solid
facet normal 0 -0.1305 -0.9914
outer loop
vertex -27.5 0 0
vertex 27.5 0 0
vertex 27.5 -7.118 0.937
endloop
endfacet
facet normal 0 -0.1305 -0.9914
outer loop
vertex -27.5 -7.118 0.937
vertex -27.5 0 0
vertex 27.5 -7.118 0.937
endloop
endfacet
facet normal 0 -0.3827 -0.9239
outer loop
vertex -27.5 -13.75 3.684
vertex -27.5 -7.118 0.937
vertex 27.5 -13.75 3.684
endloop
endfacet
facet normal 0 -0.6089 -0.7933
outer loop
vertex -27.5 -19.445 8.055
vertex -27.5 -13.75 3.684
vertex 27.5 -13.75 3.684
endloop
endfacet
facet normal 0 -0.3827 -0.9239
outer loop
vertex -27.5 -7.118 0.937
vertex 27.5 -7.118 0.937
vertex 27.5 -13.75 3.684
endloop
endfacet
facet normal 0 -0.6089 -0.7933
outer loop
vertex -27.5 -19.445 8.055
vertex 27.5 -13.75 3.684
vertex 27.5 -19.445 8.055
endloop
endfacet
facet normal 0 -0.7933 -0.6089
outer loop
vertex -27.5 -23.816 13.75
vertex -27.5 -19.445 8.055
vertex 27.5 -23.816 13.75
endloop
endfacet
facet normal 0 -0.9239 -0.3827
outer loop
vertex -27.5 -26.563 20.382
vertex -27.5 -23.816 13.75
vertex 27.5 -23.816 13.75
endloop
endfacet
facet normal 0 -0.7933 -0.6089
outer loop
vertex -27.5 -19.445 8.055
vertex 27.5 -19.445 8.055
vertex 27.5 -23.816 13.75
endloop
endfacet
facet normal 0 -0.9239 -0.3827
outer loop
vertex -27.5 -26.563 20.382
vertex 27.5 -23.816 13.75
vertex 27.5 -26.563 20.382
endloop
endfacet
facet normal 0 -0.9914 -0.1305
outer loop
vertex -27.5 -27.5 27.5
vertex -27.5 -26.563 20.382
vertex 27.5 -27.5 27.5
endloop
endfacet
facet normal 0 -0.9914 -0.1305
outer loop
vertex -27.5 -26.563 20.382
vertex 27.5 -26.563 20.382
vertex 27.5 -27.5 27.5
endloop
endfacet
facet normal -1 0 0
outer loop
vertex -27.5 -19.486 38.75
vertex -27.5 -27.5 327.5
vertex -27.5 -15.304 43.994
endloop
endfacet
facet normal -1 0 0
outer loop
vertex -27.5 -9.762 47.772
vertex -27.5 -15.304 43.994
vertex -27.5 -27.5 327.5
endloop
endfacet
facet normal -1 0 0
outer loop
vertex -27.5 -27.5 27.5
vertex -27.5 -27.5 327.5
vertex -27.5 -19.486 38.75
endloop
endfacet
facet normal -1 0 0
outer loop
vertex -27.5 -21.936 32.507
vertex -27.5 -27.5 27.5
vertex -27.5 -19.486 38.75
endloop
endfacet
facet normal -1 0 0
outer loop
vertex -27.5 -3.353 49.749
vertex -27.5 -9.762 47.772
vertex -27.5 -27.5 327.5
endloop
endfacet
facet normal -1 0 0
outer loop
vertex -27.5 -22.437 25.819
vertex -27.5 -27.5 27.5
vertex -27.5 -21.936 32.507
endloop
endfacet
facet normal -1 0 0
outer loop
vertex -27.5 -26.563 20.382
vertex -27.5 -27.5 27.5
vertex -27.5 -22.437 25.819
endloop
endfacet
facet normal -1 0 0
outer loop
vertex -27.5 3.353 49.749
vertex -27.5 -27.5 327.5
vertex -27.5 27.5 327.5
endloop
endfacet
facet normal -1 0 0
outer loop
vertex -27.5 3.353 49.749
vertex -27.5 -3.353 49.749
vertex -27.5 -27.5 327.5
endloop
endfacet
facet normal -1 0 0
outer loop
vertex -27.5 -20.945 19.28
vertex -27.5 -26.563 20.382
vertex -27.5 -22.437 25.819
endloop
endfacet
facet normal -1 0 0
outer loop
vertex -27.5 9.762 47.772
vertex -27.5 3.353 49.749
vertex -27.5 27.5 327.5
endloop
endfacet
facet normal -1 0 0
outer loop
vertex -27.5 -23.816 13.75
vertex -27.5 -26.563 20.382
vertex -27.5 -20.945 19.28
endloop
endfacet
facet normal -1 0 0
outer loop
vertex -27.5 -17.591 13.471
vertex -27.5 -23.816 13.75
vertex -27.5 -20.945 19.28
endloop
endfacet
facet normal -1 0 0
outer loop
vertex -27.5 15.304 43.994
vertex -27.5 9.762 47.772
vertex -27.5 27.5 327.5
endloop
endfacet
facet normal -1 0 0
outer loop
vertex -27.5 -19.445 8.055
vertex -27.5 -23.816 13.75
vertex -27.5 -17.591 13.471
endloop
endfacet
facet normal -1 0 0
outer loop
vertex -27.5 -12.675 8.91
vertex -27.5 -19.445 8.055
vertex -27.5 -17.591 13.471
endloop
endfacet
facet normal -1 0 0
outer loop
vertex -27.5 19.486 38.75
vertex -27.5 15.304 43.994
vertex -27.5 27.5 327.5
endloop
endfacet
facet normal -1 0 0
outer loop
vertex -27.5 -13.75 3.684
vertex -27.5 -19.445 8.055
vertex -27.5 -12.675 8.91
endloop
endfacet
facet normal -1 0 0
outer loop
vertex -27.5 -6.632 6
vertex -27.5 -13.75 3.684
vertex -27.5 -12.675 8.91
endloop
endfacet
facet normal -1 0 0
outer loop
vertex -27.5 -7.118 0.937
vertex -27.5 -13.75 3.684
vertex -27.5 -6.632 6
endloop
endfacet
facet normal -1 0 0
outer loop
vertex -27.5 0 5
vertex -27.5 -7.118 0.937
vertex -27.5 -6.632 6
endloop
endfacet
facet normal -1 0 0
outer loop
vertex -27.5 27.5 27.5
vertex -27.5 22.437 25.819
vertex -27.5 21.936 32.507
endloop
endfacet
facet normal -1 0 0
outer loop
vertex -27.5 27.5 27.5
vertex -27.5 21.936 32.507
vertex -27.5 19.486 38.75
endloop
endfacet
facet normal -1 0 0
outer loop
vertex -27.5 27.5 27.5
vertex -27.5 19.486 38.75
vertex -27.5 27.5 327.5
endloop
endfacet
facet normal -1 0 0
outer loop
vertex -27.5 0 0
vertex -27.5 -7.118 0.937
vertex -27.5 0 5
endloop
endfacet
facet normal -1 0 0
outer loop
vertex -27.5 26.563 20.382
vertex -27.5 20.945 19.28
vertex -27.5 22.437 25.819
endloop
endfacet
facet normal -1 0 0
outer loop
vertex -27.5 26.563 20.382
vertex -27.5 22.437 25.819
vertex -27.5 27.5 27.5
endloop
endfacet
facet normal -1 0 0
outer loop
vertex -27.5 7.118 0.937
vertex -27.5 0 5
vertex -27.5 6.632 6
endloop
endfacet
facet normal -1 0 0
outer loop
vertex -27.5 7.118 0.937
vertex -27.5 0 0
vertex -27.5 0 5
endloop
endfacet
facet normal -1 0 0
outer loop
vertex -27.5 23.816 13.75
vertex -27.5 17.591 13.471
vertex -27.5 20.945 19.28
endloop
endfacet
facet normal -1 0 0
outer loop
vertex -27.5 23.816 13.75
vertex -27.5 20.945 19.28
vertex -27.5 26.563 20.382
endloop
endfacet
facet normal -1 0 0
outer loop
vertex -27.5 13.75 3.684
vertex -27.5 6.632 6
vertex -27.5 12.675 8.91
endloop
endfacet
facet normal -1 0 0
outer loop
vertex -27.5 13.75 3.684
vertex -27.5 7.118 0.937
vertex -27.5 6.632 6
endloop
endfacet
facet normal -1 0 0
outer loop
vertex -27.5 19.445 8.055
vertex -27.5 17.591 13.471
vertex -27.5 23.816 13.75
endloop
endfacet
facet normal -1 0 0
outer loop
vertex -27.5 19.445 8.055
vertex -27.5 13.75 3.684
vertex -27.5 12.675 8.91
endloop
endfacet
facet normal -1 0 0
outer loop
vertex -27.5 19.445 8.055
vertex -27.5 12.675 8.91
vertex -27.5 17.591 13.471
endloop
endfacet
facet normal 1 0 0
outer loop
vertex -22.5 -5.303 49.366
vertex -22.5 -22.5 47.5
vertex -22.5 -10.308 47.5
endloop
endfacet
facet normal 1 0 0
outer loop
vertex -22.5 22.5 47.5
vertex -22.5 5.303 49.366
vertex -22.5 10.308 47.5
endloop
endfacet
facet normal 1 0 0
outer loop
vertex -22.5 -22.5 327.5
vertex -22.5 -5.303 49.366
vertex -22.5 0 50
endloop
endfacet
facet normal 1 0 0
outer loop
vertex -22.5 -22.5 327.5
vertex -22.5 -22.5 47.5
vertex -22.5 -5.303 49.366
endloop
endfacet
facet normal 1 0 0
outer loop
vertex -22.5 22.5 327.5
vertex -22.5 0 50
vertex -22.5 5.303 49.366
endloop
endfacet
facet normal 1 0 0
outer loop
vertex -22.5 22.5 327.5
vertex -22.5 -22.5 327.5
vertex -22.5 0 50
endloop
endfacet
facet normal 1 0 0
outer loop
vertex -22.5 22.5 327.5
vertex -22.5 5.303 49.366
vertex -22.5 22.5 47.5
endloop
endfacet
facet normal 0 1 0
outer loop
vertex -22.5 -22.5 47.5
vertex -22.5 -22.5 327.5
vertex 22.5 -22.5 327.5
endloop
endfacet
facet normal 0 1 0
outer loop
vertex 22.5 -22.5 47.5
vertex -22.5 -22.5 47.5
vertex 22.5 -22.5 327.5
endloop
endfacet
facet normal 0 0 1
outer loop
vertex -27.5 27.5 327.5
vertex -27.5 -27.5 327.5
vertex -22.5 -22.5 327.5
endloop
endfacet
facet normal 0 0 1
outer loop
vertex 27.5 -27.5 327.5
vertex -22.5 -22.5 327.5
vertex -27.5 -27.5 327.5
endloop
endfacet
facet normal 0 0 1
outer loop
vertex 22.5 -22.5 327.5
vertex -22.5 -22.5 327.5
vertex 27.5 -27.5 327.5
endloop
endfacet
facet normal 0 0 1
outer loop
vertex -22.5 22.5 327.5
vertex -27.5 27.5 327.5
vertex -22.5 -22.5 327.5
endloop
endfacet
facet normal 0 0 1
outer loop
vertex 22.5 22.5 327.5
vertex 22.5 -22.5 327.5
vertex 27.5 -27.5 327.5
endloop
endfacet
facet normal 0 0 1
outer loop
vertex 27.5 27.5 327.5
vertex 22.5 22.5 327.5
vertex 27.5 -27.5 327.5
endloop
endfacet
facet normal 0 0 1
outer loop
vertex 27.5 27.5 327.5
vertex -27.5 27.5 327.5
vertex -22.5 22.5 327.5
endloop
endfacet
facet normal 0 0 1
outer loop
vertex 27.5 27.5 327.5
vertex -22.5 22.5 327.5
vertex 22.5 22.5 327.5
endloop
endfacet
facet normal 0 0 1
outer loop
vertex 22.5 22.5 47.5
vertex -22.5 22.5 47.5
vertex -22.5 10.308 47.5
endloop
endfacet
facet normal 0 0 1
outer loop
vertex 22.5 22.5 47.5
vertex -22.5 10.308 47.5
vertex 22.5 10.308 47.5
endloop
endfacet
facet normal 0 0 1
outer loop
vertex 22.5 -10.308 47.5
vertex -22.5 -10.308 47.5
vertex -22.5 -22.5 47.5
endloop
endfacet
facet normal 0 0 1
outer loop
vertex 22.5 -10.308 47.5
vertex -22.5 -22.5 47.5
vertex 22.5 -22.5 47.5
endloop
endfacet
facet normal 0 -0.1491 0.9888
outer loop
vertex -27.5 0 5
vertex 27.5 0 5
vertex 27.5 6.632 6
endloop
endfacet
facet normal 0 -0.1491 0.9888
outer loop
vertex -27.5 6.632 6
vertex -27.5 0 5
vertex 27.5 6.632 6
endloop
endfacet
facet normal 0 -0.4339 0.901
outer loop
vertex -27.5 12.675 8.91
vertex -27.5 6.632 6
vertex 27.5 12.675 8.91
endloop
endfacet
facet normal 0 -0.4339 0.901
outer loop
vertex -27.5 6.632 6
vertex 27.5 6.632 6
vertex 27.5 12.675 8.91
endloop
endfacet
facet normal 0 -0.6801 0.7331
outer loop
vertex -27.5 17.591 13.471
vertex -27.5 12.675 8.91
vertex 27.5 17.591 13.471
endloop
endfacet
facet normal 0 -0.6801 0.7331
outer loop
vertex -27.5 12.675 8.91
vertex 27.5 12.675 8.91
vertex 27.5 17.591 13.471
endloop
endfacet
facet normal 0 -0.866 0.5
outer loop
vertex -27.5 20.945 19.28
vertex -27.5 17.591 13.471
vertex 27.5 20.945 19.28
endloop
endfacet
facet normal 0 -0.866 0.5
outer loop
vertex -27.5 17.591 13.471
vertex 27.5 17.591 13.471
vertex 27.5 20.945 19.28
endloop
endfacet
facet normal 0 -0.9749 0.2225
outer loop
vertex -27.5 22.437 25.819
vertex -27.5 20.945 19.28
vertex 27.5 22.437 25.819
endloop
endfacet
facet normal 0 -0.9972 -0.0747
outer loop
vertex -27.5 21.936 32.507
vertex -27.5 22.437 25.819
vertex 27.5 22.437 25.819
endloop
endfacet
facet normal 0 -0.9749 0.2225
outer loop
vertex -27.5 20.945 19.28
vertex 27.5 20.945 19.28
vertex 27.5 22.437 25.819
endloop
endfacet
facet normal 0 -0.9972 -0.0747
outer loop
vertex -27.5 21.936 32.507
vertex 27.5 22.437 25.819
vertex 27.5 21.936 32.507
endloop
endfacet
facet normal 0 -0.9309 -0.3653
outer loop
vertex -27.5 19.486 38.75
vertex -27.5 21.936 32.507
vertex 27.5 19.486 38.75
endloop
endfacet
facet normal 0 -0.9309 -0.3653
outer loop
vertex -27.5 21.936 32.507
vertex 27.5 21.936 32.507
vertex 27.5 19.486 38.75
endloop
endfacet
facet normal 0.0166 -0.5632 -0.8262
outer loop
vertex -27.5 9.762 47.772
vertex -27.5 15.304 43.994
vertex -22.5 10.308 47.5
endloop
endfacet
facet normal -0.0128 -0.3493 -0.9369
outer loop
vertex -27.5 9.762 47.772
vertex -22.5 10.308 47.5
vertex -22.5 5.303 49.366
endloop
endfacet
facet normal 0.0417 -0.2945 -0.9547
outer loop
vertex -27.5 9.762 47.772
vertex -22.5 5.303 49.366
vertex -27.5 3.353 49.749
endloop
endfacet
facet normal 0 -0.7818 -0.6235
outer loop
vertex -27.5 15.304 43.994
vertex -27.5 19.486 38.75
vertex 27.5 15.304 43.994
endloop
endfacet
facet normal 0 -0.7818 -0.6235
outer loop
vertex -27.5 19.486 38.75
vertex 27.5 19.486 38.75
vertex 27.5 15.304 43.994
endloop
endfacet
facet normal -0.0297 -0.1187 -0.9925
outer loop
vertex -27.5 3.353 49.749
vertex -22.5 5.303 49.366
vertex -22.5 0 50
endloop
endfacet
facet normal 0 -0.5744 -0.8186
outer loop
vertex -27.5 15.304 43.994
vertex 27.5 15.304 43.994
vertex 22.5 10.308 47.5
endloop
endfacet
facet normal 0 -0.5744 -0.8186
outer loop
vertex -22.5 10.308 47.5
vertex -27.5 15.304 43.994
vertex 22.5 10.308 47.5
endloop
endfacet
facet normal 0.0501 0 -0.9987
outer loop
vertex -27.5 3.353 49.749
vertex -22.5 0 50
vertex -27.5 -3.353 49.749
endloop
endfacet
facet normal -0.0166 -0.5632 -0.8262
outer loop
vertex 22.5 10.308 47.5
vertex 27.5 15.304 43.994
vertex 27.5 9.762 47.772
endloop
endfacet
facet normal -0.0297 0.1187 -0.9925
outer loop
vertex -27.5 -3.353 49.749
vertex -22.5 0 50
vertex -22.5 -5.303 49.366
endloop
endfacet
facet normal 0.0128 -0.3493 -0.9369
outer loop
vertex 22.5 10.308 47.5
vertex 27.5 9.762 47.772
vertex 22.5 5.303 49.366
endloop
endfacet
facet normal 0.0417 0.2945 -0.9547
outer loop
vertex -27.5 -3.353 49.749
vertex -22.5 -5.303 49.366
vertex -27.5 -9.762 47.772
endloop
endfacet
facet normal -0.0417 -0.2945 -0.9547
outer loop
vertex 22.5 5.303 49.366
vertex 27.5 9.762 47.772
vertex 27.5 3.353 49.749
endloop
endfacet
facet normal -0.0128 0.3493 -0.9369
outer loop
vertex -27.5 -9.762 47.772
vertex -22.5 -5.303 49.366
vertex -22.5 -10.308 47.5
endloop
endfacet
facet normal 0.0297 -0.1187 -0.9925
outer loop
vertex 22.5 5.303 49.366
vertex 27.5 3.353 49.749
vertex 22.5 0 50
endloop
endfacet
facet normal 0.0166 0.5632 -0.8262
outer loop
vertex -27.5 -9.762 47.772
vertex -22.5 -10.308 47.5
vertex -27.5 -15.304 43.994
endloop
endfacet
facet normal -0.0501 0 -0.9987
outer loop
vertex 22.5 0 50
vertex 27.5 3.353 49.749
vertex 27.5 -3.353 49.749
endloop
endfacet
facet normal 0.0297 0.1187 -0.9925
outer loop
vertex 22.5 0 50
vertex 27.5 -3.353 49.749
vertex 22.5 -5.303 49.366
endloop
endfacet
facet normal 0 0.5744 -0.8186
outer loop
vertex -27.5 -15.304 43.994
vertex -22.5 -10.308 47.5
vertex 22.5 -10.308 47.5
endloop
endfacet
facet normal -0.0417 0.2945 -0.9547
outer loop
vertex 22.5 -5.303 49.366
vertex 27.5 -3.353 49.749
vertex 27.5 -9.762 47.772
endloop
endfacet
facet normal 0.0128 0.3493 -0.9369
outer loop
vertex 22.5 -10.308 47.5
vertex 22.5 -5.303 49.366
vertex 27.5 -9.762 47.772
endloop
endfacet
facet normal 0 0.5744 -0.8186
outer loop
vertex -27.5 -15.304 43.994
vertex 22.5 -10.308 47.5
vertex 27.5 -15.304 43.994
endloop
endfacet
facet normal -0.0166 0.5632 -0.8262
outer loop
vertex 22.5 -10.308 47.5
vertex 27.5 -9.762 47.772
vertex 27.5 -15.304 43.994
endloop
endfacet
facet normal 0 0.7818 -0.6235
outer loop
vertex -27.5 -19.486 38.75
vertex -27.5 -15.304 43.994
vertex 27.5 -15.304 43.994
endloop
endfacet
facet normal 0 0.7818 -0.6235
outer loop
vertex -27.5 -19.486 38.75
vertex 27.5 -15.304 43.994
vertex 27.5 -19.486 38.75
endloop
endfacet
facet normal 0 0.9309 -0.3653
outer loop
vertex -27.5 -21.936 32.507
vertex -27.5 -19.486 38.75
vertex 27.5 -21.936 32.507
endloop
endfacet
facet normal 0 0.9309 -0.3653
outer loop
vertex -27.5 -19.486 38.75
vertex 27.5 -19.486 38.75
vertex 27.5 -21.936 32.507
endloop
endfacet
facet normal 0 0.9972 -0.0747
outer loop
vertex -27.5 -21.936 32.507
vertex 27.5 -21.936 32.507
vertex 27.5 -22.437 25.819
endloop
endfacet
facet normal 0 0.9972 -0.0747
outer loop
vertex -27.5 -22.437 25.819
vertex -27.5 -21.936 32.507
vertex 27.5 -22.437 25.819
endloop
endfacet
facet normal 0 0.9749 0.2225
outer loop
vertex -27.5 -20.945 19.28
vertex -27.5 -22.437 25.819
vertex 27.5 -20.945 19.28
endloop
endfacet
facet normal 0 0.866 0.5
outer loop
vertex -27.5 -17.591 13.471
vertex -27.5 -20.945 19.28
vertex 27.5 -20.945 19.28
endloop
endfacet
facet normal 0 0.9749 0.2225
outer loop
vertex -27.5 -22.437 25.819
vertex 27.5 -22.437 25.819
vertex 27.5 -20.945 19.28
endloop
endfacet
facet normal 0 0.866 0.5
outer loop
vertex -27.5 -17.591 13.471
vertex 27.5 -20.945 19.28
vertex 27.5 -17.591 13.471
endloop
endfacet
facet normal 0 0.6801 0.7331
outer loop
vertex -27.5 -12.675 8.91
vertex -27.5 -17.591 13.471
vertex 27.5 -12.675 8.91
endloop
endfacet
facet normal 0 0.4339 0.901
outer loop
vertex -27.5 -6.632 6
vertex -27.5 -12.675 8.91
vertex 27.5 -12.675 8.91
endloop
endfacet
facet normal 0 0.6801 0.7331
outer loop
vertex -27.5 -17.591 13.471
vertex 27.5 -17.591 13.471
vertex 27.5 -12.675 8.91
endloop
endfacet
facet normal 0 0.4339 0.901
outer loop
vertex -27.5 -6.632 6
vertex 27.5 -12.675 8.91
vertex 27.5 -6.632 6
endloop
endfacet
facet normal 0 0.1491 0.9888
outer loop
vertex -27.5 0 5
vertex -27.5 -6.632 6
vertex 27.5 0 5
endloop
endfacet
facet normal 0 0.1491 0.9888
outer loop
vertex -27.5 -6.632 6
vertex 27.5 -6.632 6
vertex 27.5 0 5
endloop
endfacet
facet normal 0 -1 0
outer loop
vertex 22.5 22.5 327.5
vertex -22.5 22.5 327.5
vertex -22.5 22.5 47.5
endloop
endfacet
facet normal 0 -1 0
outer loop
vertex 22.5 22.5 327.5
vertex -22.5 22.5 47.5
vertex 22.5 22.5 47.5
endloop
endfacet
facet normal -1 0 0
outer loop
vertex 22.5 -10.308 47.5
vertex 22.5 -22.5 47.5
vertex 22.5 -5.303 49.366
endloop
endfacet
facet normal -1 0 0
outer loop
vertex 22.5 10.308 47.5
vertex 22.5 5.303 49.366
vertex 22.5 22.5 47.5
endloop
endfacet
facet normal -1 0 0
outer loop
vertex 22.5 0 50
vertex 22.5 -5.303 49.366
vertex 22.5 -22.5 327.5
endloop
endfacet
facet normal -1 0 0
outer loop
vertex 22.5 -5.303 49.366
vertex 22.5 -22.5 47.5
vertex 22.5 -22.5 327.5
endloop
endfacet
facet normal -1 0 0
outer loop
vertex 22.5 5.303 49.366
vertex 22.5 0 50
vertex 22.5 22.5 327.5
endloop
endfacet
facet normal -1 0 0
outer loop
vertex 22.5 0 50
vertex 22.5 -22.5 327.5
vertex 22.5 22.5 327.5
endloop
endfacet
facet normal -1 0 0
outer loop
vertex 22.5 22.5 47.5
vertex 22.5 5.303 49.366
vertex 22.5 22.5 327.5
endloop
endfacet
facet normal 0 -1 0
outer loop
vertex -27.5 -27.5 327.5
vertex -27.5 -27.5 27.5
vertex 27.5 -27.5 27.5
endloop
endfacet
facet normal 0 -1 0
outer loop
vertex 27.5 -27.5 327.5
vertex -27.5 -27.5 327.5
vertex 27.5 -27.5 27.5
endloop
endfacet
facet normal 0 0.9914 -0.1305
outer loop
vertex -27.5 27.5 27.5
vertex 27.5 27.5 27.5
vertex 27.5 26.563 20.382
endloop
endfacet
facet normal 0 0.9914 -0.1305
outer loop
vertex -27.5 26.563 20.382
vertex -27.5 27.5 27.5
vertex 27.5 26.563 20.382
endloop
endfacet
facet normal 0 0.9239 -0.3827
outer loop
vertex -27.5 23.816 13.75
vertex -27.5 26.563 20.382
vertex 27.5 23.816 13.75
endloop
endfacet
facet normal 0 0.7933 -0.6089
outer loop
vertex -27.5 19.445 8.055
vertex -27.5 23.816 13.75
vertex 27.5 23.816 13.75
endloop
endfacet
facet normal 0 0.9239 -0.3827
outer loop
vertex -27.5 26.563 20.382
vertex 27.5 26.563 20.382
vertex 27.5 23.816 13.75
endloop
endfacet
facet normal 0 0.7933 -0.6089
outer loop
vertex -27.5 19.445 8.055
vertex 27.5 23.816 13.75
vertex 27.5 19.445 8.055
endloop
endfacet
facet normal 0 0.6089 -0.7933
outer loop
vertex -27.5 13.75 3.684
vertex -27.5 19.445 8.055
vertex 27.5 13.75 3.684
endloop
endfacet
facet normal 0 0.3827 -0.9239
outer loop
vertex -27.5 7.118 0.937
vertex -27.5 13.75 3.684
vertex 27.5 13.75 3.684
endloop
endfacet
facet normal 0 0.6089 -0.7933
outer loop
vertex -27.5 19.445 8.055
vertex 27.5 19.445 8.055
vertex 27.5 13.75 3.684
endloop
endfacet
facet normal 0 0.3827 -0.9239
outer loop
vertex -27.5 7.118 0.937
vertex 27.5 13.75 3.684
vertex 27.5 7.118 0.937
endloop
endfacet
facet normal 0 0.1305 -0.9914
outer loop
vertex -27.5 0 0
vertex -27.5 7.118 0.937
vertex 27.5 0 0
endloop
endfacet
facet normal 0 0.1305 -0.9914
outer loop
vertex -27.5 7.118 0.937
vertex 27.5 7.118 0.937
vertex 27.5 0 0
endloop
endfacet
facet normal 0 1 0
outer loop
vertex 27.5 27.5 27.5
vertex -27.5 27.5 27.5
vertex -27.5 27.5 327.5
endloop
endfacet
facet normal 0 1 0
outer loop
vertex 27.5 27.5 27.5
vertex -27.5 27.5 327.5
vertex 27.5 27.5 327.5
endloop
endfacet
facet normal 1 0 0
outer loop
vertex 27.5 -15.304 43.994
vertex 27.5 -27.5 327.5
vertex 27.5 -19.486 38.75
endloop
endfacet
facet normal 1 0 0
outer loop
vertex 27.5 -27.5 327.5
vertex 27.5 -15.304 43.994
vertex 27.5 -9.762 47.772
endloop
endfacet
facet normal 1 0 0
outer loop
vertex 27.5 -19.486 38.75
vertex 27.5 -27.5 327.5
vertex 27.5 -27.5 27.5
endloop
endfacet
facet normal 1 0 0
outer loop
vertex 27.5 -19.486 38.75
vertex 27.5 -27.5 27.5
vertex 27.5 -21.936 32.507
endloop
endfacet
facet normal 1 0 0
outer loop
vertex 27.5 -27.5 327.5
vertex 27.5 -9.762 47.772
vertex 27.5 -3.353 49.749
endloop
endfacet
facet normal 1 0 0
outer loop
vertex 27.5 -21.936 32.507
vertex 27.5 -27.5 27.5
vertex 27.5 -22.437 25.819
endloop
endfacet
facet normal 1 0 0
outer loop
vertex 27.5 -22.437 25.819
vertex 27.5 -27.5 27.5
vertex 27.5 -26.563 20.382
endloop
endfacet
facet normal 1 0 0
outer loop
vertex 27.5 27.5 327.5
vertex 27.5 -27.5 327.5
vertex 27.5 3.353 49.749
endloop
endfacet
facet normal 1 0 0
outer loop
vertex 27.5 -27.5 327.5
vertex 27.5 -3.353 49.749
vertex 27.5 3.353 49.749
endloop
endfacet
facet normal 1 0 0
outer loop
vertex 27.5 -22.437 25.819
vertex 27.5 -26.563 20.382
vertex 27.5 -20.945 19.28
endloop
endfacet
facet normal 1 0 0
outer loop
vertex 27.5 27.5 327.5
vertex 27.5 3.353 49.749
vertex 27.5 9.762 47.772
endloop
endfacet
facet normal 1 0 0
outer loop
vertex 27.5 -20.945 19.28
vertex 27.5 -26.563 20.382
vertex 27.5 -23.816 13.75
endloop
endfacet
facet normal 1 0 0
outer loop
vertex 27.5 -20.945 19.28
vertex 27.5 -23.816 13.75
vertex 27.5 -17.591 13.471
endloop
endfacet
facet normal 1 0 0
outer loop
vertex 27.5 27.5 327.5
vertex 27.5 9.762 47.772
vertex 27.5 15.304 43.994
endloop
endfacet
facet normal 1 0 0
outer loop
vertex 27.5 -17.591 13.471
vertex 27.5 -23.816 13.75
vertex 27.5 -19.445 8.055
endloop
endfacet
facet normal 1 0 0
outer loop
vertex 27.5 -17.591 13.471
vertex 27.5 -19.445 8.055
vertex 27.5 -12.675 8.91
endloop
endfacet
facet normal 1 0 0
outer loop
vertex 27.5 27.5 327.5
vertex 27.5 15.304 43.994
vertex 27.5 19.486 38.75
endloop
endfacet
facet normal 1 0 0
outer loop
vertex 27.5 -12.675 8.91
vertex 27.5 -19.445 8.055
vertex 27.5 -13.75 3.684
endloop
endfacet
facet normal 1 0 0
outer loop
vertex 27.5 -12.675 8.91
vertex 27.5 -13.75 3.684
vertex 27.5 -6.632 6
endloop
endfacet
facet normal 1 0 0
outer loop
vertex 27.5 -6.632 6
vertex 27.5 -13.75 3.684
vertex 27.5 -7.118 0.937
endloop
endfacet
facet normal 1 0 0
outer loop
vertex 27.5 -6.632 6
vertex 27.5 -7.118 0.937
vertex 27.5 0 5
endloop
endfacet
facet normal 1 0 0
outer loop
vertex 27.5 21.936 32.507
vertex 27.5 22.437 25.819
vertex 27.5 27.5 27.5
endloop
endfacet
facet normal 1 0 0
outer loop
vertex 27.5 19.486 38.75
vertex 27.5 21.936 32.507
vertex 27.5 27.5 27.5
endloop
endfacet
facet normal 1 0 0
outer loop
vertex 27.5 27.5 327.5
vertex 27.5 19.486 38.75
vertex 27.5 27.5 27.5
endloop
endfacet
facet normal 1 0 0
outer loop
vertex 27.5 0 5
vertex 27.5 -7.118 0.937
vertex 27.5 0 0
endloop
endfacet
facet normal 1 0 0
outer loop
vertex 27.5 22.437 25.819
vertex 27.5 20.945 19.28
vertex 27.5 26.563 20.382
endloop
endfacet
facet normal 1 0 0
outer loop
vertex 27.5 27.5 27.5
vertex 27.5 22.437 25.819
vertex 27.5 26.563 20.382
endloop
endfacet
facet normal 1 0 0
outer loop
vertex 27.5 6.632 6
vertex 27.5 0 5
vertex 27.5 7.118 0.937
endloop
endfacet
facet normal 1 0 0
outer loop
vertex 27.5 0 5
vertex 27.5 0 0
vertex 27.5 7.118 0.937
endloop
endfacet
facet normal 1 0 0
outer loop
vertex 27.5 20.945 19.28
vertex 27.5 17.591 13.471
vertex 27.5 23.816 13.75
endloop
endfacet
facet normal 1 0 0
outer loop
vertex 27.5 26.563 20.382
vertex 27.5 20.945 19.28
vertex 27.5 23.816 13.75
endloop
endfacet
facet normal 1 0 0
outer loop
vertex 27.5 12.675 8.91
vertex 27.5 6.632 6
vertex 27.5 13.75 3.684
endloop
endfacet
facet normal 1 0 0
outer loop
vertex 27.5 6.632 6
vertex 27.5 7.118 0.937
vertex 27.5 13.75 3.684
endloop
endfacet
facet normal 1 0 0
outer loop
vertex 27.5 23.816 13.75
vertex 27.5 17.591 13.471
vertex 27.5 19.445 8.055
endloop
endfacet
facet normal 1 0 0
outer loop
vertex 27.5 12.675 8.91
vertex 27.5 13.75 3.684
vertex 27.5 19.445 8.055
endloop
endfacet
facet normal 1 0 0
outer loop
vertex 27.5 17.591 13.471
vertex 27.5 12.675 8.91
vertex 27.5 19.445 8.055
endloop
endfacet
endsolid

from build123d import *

# Parameters (mm, degrees)
SKETCH1_W           = 55
SKETCH1_H           = 55
BOSS_EXTRUDE1_DEPTH = 327.5
SKETCH2_R           = 22.5
CUT_EXTRUDE1_DEPTH  = 55
CUT_EXTRUDE2_DEPTH  = 55
SKETCH4_W           = 45
SKETCH4_H           = 45
CUT_EXTRUDE3_DEPTH  = 280


with BuildPart() as part:
    # Sketch1 → Boss-Extrude1 (new body)
    with BuildSketch(Plane.XY):
        Rectangle(SKETCH1_W, SKETCH1_H)
    extrude(amount=BOSS_EXTRUDE1_DEPTH)

    # Sketch2 → Cut-Extrude1 (cut)
    with BuildSketch(Plane(origin=(27.5, 0, 0), x_dir=(0, 0, -1), z_dir=(1, 0, 0))):
        with Locations((-27.5, 0)):
            Circle(SKETCH2_R)
    extrude(amount=-CUT_EXTRUDE1_DEPTH, mode=Mode.SUBTRACT)

    # Sketch3 → Cut-Extrude2 (cut)
    with BuildSketch(Plane(origin=(27.5, 0, 0), x_dir=(0, 0, -1), z_dir=(1, 0, 0))):
        with BuildLine():
            Line((0, 27.5), (-27.5, 27.5))
            ThreePointArc((-27.5, 27.5), (-8.054563517, 19.445436483), (0, 0))
            Line((0, 0), (0, 27.5))
        make_face()
        with BuildLine():
            Line((0, -27.5), (0, 0))
            ThreePointArc((0, 0), (-8.054563517, -19.445436483), (-27.5, -27.5))
            Line((-27.5, -27.5), (0, -27.5))
        make_face()
    extrude(amount=-CUT_EXTRUDE2_DEPTH, mode=Mode.SUBTRACT)

    # Sketch4 → Cut-Extrude3 (cut)
    with BuildSketch(Plane.XY.offset(327.5)):
        Rectangle(SKETCH4_W, SKETCH4_H)
    extrude(amount=-CUT_EXTRUDE3_DEPTH, mode=Mode.SUBTRACT)


solid = part.part
